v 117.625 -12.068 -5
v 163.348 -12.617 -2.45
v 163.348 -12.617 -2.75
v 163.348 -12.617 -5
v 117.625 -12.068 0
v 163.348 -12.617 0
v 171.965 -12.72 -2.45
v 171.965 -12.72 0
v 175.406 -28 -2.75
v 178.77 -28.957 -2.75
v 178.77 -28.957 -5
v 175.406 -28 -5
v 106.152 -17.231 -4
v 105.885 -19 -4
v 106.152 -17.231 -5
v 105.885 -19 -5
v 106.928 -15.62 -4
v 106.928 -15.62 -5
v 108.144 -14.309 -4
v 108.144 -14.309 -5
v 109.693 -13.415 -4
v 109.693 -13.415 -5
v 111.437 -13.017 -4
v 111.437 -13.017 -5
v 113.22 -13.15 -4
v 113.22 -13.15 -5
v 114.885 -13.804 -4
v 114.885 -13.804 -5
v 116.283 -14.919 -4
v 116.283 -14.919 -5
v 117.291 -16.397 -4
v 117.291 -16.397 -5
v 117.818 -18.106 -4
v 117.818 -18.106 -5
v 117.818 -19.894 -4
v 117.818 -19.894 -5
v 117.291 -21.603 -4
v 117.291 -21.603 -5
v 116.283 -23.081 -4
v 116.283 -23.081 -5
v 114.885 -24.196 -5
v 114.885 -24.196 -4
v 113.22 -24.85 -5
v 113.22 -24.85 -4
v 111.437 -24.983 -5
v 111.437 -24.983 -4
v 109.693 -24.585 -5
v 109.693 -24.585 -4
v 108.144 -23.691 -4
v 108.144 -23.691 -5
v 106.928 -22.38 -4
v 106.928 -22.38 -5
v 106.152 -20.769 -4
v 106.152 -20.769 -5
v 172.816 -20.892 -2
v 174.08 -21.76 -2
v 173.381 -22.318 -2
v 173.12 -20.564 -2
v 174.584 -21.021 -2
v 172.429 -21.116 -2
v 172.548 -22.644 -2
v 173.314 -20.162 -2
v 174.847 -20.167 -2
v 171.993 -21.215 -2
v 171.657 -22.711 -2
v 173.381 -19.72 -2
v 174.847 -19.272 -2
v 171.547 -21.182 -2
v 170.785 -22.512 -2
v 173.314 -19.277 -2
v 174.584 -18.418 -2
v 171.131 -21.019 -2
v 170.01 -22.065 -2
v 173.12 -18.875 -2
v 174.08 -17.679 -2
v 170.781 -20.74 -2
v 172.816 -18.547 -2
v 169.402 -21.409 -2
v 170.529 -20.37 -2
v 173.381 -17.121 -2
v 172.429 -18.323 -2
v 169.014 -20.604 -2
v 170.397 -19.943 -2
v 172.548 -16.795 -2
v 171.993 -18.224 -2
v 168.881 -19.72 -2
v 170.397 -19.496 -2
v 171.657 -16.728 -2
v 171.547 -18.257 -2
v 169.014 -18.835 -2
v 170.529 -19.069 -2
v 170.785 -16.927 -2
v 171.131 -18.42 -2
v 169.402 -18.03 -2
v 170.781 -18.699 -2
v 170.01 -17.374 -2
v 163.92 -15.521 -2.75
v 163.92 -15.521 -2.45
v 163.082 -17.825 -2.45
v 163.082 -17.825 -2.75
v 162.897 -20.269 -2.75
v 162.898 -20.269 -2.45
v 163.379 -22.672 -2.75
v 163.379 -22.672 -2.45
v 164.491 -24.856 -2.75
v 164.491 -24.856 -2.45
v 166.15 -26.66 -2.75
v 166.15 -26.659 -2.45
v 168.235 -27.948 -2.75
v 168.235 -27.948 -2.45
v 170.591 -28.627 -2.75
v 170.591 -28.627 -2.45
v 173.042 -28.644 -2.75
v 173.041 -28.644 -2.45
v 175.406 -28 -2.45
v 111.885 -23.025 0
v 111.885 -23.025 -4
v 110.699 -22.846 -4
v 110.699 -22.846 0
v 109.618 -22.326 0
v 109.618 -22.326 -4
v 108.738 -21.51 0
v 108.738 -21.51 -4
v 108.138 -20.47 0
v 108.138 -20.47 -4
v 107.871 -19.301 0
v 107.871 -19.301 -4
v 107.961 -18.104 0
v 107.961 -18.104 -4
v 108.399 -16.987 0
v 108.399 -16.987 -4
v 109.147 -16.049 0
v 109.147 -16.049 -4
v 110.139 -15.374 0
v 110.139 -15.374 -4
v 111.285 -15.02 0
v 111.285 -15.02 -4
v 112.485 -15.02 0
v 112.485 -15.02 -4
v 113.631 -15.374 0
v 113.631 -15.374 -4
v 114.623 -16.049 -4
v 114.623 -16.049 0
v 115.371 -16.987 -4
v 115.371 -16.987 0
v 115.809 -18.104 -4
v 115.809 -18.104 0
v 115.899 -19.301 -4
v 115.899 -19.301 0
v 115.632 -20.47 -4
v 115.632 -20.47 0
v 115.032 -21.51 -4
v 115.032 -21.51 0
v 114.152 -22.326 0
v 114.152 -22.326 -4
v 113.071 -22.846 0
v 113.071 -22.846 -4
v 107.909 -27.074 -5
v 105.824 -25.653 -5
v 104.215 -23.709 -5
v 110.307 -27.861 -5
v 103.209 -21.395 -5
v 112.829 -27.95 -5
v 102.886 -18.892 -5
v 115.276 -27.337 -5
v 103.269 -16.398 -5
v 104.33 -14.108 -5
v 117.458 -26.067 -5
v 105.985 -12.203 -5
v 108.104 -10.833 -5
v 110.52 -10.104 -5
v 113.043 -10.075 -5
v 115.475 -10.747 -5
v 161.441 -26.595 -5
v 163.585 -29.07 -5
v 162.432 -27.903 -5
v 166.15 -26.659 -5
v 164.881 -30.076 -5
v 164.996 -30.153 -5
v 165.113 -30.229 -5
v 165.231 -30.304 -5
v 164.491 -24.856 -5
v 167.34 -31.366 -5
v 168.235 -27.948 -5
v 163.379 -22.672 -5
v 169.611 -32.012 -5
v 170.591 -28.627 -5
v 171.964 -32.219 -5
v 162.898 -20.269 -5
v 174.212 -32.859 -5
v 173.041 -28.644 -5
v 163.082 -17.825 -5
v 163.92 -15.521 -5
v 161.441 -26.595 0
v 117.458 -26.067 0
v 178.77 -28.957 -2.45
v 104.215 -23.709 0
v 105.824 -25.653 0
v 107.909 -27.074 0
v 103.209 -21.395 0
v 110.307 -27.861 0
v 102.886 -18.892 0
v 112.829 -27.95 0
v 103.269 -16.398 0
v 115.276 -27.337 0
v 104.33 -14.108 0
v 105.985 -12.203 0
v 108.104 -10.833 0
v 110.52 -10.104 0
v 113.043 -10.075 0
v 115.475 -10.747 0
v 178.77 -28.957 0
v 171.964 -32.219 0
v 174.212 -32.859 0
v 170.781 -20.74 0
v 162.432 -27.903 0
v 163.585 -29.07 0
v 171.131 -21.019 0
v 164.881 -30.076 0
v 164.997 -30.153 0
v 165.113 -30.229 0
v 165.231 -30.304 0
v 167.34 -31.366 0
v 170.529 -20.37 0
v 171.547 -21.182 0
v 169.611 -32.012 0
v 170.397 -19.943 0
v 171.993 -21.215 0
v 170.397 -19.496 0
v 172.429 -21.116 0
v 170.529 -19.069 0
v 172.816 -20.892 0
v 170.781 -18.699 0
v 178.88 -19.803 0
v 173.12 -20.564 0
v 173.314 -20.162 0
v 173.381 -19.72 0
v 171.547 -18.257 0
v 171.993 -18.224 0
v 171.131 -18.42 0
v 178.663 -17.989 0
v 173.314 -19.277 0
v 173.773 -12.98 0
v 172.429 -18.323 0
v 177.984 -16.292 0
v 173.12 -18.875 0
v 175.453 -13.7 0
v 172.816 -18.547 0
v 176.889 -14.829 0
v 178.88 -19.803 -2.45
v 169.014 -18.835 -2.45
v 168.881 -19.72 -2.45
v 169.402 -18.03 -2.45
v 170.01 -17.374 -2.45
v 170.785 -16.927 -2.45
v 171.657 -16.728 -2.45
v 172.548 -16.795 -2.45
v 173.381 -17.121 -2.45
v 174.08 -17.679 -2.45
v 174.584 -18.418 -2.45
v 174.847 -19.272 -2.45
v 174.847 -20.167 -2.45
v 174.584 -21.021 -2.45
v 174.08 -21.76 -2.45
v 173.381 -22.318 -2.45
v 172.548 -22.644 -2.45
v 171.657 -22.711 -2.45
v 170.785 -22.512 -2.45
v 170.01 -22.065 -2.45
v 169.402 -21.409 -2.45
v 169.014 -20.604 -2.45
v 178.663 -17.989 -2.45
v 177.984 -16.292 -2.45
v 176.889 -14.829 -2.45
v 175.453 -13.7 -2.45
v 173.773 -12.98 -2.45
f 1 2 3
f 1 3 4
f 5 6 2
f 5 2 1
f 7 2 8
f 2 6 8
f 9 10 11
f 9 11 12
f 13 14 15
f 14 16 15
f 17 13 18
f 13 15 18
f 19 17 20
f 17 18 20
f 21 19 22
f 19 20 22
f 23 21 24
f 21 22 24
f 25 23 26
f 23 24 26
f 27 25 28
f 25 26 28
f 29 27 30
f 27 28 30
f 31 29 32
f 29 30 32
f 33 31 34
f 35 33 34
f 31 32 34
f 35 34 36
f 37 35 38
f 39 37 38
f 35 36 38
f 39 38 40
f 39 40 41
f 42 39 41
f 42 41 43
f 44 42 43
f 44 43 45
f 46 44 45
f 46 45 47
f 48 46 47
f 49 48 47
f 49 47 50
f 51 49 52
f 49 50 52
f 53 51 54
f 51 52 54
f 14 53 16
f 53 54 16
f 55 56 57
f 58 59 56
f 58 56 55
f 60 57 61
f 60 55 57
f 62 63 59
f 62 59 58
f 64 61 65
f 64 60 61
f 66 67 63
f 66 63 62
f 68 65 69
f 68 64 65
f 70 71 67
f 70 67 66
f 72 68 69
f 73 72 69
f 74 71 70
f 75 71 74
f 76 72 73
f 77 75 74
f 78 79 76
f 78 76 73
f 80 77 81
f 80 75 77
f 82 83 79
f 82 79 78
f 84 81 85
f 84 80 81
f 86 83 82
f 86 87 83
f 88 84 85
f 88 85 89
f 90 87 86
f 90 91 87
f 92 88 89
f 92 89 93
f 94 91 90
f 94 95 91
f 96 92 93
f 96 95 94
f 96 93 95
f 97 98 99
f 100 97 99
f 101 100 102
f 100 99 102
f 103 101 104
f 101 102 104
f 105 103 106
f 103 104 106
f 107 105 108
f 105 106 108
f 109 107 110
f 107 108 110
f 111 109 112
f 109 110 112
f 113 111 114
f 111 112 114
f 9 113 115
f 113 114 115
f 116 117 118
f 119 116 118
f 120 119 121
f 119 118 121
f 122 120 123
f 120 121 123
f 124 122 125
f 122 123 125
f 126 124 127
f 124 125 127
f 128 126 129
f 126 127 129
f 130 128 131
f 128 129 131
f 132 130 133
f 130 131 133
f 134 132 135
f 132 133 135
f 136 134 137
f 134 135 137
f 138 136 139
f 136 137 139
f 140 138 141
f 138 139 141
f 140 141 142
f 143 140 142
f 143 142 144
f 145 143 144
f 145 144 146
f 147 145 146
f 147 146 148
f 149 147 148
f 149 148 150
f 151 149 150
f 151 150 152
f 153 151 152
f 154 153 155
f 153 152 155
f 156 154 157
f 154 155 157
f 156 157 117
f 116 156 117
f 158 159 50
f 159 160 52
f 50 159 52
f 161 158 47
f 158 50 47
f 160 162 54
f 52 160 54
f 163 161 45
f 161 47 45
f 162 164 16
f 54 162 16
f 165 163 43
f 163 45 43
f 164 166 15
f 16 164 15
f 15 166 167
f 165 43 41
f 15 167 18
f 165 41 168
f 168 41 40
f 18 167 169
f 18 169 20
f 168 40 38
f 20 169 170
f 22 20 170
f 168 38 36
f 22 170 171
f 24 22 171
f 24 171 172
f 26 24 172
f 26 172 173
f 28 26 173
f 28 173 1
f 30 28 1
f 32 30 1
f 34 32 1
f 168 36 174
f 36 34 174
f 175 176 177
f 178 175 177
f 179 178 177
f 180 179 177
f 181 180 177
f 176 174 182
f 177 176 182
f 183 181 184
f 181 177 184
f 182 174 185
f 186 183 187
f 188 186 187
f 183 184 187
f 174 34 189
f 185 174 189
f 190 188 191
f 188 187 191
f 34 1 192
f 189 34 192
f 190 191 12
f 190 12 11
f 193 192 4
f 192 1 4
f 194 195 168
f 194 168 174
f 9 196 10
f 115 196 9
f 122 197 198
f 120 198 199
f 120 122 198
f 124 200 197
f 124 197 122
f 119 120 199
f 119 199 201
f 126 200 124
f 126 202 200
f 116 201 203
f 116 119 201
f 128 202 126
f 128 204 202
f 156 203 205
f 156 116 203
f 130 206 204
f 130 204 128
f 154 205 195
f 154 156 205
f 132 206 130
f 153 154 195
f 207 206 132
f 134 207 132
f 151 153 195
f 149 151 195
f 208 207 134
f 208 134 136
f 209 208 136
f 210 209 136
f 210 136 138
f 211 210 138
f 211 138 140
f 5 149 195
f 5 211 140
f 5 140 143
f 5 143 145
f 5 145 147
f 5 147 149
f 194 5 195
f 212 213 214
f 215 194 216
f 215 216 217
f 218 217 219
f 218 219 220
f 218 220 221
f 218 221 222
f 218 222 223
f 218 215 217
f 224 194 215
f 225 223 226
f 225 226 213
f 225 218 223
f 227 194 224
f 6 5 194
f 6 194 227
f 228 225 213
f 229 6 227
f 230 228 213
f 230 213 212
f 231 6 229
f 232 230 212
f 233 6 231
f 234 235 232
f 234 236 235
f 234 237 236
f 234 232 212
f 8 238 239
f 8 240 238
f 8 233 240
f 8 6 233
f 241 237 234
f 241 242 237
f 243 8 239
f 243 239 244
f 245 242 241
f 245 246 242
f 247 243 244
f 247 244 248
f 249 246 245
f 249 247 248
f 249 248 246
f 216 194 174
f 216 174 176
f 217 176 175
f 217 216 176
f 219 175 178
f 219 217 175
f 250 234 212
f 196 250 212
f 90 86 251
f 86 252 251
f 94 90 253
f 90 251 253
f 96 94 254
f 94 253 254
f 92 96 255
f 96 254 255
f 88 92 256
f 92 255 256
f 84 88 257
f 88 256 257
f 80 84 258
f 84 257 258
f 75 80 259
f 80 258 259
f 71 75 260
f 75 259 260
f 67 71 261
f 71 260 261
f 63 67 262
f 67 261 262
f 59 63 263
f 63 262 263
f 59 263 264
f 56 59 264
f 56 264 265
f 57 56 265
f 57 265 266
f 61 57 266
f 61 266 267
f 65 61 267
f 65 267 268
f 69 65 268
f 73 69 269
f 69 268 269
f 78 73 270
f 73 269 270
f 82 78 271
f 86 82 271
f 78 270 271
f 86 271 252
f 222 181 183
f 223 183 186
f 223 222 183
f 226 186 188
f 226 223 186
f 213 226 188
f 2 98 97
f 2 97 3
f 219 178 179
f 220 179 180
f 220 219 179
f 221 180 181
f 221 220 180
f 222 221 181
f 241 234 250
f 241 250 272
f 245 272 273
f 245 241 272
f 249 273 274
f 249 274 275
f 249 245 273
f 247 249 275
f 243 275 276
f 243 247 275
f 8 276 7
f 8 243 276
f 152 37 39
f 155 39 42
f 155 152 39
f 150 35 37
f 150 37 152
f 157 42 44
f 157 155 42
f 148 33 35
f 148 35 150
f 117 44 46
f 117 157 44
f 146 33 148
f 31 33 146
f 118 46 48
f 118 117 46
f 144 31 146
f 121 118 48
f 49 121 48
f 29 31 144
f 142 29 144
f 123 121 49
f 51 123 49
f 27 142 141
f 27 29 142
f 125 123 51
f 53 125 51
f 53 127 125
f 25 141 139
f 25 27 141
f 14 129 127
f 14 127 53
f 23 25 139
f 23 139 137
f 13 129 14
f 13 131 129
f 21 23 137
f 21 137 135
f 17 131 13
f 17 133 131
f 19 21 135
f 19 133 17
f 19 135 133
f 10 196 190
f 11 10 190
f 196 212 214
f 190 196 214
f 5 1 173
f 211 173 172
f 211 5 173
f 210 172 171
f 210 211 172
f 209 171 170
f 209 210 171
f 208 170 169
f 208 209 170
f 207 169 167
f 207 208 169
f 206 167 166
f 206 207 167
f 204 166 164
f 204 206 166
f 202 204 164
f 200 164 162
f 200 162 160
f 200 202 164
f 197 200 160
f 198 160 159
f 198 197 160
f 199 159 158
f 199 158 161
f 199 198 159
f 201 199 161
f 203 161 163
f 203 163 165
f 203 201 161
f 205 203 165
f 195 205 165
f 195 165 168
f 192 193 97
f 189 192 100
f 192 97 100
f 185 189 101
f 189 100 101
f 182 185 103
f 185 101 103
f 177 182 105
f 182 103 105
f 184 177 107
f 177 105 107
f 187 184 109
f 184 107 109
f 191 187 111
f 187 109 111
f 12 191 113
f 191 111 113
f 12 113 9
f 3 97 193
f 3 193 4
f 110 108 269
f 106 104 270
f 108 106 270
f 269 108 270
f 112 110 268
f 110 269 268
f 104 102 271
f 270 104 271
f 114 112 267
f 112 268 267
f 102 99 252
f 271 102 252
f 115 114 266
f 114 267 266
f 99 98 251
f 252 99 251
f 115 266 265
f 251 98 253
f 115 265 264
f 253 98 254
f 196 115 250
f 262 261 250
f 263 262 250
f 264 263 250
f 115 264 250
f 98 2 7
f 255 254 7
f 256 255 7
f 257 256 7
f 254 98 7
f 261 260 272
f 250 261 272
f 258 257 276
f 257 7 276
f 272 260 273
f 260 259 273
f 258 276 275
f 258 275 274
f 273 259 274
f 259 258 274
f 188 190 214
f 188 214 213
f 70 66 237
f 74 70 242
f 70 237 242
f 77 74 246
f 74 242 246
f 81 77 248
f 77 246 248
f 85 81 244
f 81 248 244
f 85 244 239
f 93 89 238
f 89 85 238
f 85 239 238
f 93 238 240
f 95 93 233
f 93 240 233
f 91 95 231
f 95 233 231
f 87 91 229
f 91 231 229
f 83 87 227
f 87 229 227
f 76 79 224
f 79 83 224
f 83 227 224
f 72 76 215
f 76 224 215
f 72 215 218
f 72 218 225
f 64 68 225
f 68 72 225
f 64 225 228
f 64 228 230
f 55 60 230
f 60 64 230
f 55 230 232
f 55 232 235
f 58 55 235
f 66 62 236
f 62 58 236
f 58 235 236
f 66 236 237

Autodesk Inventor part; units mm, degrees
ref_plane "YZ Plane" through (0, 0, 0) normal (1, 0, 0) x (0, 1, 0)
ref_plane "XZ Plane" through (0, 0, 0) normal (0, 1, 0) x (-1, 0, 0)
ref_plane "XY Plane" through (0, 0, 0) normal (0, 0, 1) x (1, 0, 0)
sketch "スケッチ1" plane through (0, 0, 0) normal (0, 0, 1) x (1, 0, 0)
  line L0 (-101.5, 48) -> (108.5, 48)
  circle A0 centre (111.885, -19) radius 4
  circle A1 centre (171.8807, -19.7195) radius 4
  circle A2 centre (111.885, -19) radius 7
  circle A3 centre (171.8807, -19.7195) radius 7
  line L1 (171.8807, -19.7195) -> (111.885, -19) construction
  line L2 (171.9647, -12.72) -> (111.969, -12.0005)
  line L3 (111.8011, -25.9995) -> (171.7968, -26.719)
  arc A4 (171.7968, -26.719) -> (171.9647, -12.72) centre (171.8807, -19.7195) ccw
  arc A5 (111.969, -12.0005) -> (111.8011, -25.9995) centre (111.885, -19) ccw
  line L4 (173.7961, -12.9866) -> (250.1906, -34.7195)
  circle A6 centre (241.9819, -63.5746) radius 30
  line L5 (268.18, -78.1916) -> (221.9512, -41.2414)
  line L6 (221.9512, -41.2414) -> (169.9654, -26.4523)
  line L7 (271.9819, -113.1361) -> (271.9819, -54.8199)
  line L8 (111.885, -19) -> (111.885, 41) construction
  line L9 (118.885, -19) -> (118.885, 41)
  line L10 (104.885, 41) -> (104.885, -19)
  arc A7 (104.885, -19) -> (118.885, -19) centre (111.885, -19) ccw
  arc A8 (118.885, 41) -> (104.885, 41) centre (111.885, 41) ccw
  circle A9 centre (29.4318, 47.238) radius 30
  line L11 (113.3193, 34.1485) -> (35.5787, 17.8745)
  line L12 (-0.5585, 48) -> (57.5489, 36.7771)
  line L13 (57.5489, 36.7771) -> (110.4508, 47.8515)
  circle A10 centre (113.5, -20) radius 68
  line L14 (321.9635, -82.9551) -> (60.2705, 100.2843)
  line L15 (259.1892, -39) -> (111.885, -19)
  arc A11 (93.5924, -27.1048) -> (135.371, -5.9244) centre (95.0604, 21.7941) ccw
  arc A12 (135.371, -5.9244) -> (135.8476, -3.6716) centre (132.899, -4.2246) ccw
  arc A13 (135.8476, -3.6716) -> (83.1833, 18.5565) centre (102.1579, -9.9896) ccw
  line L16 (111.885, -19) -> (112.6892, 40.9946) construction
  line L17 (118.8844, -19.0938) -> (119.6886, 40.9008)
  line L18 (105.6898, 41.0884) -> (104.8857, -18.9062)
  arc A14 (104.8857, -18.9062) -> (118.8844, -19.0938) centre (111.885, -19) ccw
  arc A15 (119.6886, 40.9008) -> (105.6898, 41.0884) centre (112.6892, 40.9946) ccw
  line L19 (164.9949, 48) -> (164.9949, 26)
  line L20 (164.9949, 26) -> (327.4949, -102)
  circle A16 centre (116.2926, -40) radius 68
  circle A17 centre (-98.885, 0) radius 67.5
  line L21 (321.3633, -8.501) -> (-152.6681, 78.4982)
  line L22 (104.8897, -3) -> (104.8897, 0)
  line L23 (104.8897, -3) -> (72.0656, -3)
  line L24 (72.0656, 0) -> (104.8897, 0)
  circle A18 centre (83.3769, -17.5) radius 13.85
  line L25 (178.7705, -28.9572) -> (174.2123, -32.8589)
  line L26 (174.2123, -32.8589) -> (164.8807, -30.2042)
  line L27 (164.8807, -30.2042) -> (164.8807, -19.7195)
  line L28 (169.9654, -26.4523) -> (168.5972, -31.2615)
  line L29 (168.5972, -31.2615) -> (164.8807, -26.636)
  line L30 (178.8802, -19.8034) -> (178.6547, -38.6089)
  line L31 (165.0125, -21.0715) -> (158.1724, 13.6763)
  circle A19 centre (171.8807, -19.7195) radius 7.5
  point P0 (0, 0)
  point P1 (141.8829, -19.3597)
  point P2 (111.885, 11)
  point P3 (105.885, 0)
  point P4 (105.885, 0)
  point P5 (23.7328, -42.729)
  point P6 (112.2871, 10.9973)
  point P7 (169.2723, -12.6877)
  point P8 (163.3482, -12.6166)
  point P9 (164.4925, -18.4296)
  point P10 (172.5552, -27.1891)
  point P11 (178.8479, -22.4958)
  dimension "d0" = 8
  dimension "d1" = 8
  dimension "d2" = 3
  dimension "d3" = 3
  dimension "d4" = 60
  dimension "d5" = 14
  dimension "d6" = 14
  dimension "d7" = 60
  dimension "d8" = 14
  dimension "d9" = 60
  dimension "d10" = 14
  dimension "d11" = 6
  dimension "d12" = 35
  dimension "d13" = 13.271
  dimension "d14" = 14
  dimension "d15" = 20
  dimension "d16" = 15
  dimension "d17" = 22
  dimension "d18" = 150
  dimension "d19" = 162.5
  dimension "d20" = 0
  dimension "d21" = 136
  dimension "d22" = 136
  dimension "d23" = 135
  dimension "d24" = 38.227
  dimension "d25" = 18
  dimension "d27" = 5
  dimension "d28" = 6
  dimension "d30" = 101.823
  dimension "d31" = 101.823
  dimension "d32" = 0.5
extrude "押し出し1" add sketch "スケッチ1" against normal blind 5 contours L25 L26 L28 A19 L15 L6 | L6 L15 L30 | L15 A19 L6 | L6 A19 L30 L15 | A19 L15 L28 L3 L6 | L6 L3 A3 L30 A19 | A19 L28 L15 | L29 L3 L15 A19 L28 | L26 L27 L29 | A2 A11 | L6 A3 L3 | L3 L28 L6 | L28 A19 L15 | L15 A19 L3 L28 | L27 L15 L3 | L3 A2 A11 L15 L27 | A3 | L9 A2 L2 | L2 L17 L9 | L3 A19 L27 L31 A3 L28 | L15 L3 A19 | A2 A11 | L15 L27 A19 L3 | L15 A11 L2 L31 A19 L27 | A19 L31 L2 | L2 A3 L27 L31 A19 | L2 A11 L15 A2 L17 | L31 L27 A3 | A2 L15 A11 | A19 L31 L27 | A0 | A1
extrude "押し出し2" cut sketch "スケッチ1" against normal blind 2.75 contours L6 L15 L30 | L6 A19 L30 L15 | A19 L15 L28 L3 L6 | L6 L3 A3 L30 A19 | A19 L28 L15 | L30 A3 L4 A19 | L6 A3 L3 | L3 L28 L6 | L28 A19 L15 | L15 A19 L3 L28 | A3 | L4 A3 L2 A19 | L3 A19 L27 L31 A3 L28 | A19 L31 L2 | L2 A3 L27 L31 A19 | L31 L27 A3 | A19 L31 L27 | A1
hole "穴1" at (105.885, 0, 0) at (23.7328, -42.729, 0) at (116.2926, -40, 0) at (-98.885, 0, 0) at (171.8807, -19.7195, 0) direction (0, 0, -1) diameter 3 depth 12 tip angle 118
sketch "スケッチ2" plane through (0, 0, 0) normal (0, 0, 1) x (1, 0, 0)
  line L0 (163.3482, -12.6166) -> (164.4925, -18.4296) projected
  arc A0 (164.4925, -18.4296) -> (172.5552, -27.1891) centre (171.8807, -19.7195) ccw projected
  line L1 (172.5552, -27.1891) -> (178.7705, -28.9572) projected
  line L2 (178.7705, -28.9572) -> (174.2123, -32.8589) projected
  line L3 (174.2123, -32.8589) -> (164.8807, -30.2042) projected
  line L4 (164.8807, -30.2042) -> (164.8807, -26.636) projected
  line L5 (164.8807, -26.636) -> (111.8011, -25.9995) projected
  arc A1 (111.969, -12.0005) -> (111.8011, -25.9995) centre (111.885, -19) ccw projected
  line L6 (111.969, -12.0005) -> (163.3482, -12.6166) projected
  circle A2 centre (171.8807, -19.7195) radius 7.5
  circle A3 centre (171.8807, -19.7195) radius 12.5
  point P0 (0, 0)
  point P1 (161.4414, -26.5948)
  point P2 (164.8807, -30.0756)
  point P3 (165.2308, -30.3038)
  point P4 (171.9637, -32.2192)
  dimension "d44" = 5
extrude "押し出し3" add sketch "スケッチ2" against normal blind 5 contours L5 L4 A3 | A3 L3
sketch "スケッチ3" plane through (0, 0, 0) normal (0, 0, 1) x (1, 0, 0)
  line L0 (163.3482, -12.6166) -> (164.4925, -18.4296) projected
  arc A0 (164.4925, -18.4296) -> (172.5552, -27.1891) centre (171.8807, -19.7195) ccw projected
  line L1 (172.5552, -27.1891) -> (178.7705, -28.9572) projected
  line L2 (178.7705, -28.9572) -> (174.2123, -32.8589) projected
  line L3 (174.2123, -32.8589) -> (171.9637, -32.2192) projected
  arc A1 (165.2308, -30.3038) -> (171.9637, -32.2192) centre (171.8807, -19.7195) ccw projected
  line L4 (165.2308, -30.3038) -> (164.8807, -30.2042) projected
  line L5 (164.8807, -30.2042) -> (164.8807, -30.0756) projected
  arc A2 (161.4414, -26.5948) -> (164.8807, -30.0756) centre (171.8807, -19.7195) ccw projected
  line L6 (161.4414, -26.5948) -> (111.8011, -25.9995) projected
  arc A3 (111.969, -12.0005) -> (111.8011, -25.9995) centre (111.885, -19) ccw projected
  line L7 (111.969, -12.0005) -> (163.3482, -12.6166) projected
  circle A4 centre (171.8807, -19.7195) radius 12.5
  point P0 (0, 0)
  point P1 (165.2308, -30.3038)
extrude "押し出し4" cut sketch "スケッチ3" against normal blind 10 contours A4 L4 L5
hole "穴2" at (105.885, 0, 0) at (111.885, -19, 0) direction (0, 0, -1) diameter 8.05 depth 12 tip angle 118
sketch "スケッチ4" plane through (0, 0, 0) normal (0, 0, 1) x (1, 0, 0)
  circle A0 centre (111.885, -19) radius 4.025 projected
  line L0 (163.3482, -12.6166) -> (164.4925, -18.4296) projected
  arc A1 (164.4925, -18.4296) -> (172.5552, -27.1891) centre (171.8807, -19.7195) ccw projected
  line L1 (172.5552, -27.1891) -> (178.7705, -28.9572) projected
  line L2 (178.7705, -28.9572) -> (174.2123, -32.8589) projected
  line L3 (174.2123, -32.8589) -> (171.9637, -32.2192) projected
  arc A2 (161.4414, -26.5948) -> (171.9637, -32.2192) centre (171.8807, -19.7195) ccw projected
  line L4 (161.4414, -26.5948) -> (111.8011, -25.9995) projected
  arc A3 (111.969, -12.0005) -> (111.8011, -25.9995) centre (111.885, -19) ccw projected
  line L5 (111.969, -12.0005) -> (163.3482, -12.6166) projected
  arc A4 (164.4925, -18.4296) -> (172.5552, -27.1891) centre (171.8807, -19.7195) ccw projected
  circle A5 centre (171.8807, -19.7195) radius 7.5
  circle A6 centre (171.8807, -19.7195) radius 9
  line L6 (178.7705, -28.9572) -> (172.5552, -27.1891) projected
  line L7 (164.4925, -18.4296) -> (163.3482, -12.6166) projected
  circle A7 centre (111.885, -19) radius 9
  point P0 (0, 0)
  point P1 (175.4063, -28.0002)
  point P2 (163.9203, -15.5231)
  point P3 (163.92, -15.5211)
  point P4 (175.4063, -28.0002)
  dimension "d56" = 15
  dimension "d57" = 1.5
  dimension "d58" = 18
extrude "押し出し5" add sketch "スケッチ4" against normal blind 5 contours A7 L4 A3 L5 | L5 A3 L4 A7
extrude "押し出し6" cut sketch "スケッチ4" against normal blind 2.75 contours L0 A1 L1 A6
sketch "スケッチ6" plane through (0, 0, 0) normal (0, 0, 1) x (1, 0, 0)
  circle A0 centre (171.8807, -19.7195) radius 1.5 projected
  line L0 (163.3482, -12.6166) -> (171.9647, -12.72) projected
  line L1 (163.92, -15.5211) -> (163.3482, -12.6166) projected
  arc A1 (163.92, -15.5211) -> (175.4063, -28.0002) centre (171.8807, -19.7195) ccw projected
  line L2 (178.7705, -28.9572) -> (175.4063, -28.0002) projected
  line L3 (178.8802, -19.8034) -> (178.7705, -28.9572) projected
  arc A2 (178.8802, -19.8034) -> (171.9647, -12.72) centre (171.8807, -19.7195) ccw projected
  point P0 (0, 0)
extrude "押し出し8" cut sketch "スケッチ6" against normal blind 10
extrude "押し出し9" add sketch "スケッチ6" against normal blind 2.45
sketch "スケッチ7" plane through (0, 0, -5) normal (0, 0, -1) x (-1, 0, 0)
  arc A0 (-117.4576, -26.0673) -> (-117.6254, -12.0683) centre (-111.885, -19) ccw projected
  line L0 (-117.4576, -26.0673) -> (-161.4414, -26.5948) projected
  arc A1 (-171.9637, -32.2192) -> (-161.4414, -26.5948) centre (-171.8807, -19.7195) ccw projected
  line L1 (-171.9637, -32.2192) -> (-174.2123, -32.8589) projected
  line L2 (-174.2123, -32.8589) -> (-178.7705, -28.9572) projected
  line L3 (-178.7705, -28.9572) -> (-175.4063, -28.0002) projected
  arc A2 (-175.4063, -28.0002) -> (-163.92, -15.5211) centre (-171.8807, -19.7195) ccw projected
  line L4 (-163.92, -15.5211) -> (-163.3482, -12.6166) projected
  line L5 (-163.3482, -12.6166) -> (-117.6254, -12.0683) projected
  circle A3 centre (-111.885, -19) radius 4.025 projected
  circle A4 centre (-111.885, -19) radius 6
  point P0 (0, 0)
  dimension "d70" = 12
extrude "押し出し10" cut sketch "スケッチ7" against normal blind 1 contours A4
sketch "スケッチ8" plane through (0, 0, -5) normal (0, 0, -1) x (-1, 0, 0)
  circle A0 centre (-111.885, -19) radius 6 projected
  arc A1 (-117.4576, -26.0673) -> (-117.6254, -12.0683) centre (-111.885, -19) ccw projected
  line L0 (-117.4576, -26.0673) -> (-161.4414, -26.5948) projected
  arc A2 (-171.9637, -32.2192) -> (-161.4414, -26.5948) centre (-171.8807, -19.7195) ccw projected
  line L1 (-171.9637, -32.2192) -> (-174.2123, -32.8589) projected
  line L2 (-174.2123, -32.8589) -> (-178.7705, -28.9572) projected
  line L3 (-178.7705, -28.9572) -> (-175.4063, -28.0002) projected
  arc A3 (-175.4063, -28.0002) -> (-163.92, -15.5211) centre (-171.8807, -19.7195) ccw projected
  line L4 (-163.92, -15.5211) -> (-163.3482, -12.6166) projected
  line L5 (-163.3482, -12.6166) -> (-117.6254, -12.0683) projected
  circle A4 centre (-171.8807, -19.7195) radius 1.5 projected
  circle A5 centre (-171.8807, -19.7195) radius 3
  point P0 (0, 0)
  dimension "d73" = 6
extrude "押し出し11" cut sketch "スケッチ8" against normal blind 3 contours A5
equation "\"d9\" = d7"
equation "\"d31\" = d30"
properties part number "後ろウィング中間(ミラー)"
